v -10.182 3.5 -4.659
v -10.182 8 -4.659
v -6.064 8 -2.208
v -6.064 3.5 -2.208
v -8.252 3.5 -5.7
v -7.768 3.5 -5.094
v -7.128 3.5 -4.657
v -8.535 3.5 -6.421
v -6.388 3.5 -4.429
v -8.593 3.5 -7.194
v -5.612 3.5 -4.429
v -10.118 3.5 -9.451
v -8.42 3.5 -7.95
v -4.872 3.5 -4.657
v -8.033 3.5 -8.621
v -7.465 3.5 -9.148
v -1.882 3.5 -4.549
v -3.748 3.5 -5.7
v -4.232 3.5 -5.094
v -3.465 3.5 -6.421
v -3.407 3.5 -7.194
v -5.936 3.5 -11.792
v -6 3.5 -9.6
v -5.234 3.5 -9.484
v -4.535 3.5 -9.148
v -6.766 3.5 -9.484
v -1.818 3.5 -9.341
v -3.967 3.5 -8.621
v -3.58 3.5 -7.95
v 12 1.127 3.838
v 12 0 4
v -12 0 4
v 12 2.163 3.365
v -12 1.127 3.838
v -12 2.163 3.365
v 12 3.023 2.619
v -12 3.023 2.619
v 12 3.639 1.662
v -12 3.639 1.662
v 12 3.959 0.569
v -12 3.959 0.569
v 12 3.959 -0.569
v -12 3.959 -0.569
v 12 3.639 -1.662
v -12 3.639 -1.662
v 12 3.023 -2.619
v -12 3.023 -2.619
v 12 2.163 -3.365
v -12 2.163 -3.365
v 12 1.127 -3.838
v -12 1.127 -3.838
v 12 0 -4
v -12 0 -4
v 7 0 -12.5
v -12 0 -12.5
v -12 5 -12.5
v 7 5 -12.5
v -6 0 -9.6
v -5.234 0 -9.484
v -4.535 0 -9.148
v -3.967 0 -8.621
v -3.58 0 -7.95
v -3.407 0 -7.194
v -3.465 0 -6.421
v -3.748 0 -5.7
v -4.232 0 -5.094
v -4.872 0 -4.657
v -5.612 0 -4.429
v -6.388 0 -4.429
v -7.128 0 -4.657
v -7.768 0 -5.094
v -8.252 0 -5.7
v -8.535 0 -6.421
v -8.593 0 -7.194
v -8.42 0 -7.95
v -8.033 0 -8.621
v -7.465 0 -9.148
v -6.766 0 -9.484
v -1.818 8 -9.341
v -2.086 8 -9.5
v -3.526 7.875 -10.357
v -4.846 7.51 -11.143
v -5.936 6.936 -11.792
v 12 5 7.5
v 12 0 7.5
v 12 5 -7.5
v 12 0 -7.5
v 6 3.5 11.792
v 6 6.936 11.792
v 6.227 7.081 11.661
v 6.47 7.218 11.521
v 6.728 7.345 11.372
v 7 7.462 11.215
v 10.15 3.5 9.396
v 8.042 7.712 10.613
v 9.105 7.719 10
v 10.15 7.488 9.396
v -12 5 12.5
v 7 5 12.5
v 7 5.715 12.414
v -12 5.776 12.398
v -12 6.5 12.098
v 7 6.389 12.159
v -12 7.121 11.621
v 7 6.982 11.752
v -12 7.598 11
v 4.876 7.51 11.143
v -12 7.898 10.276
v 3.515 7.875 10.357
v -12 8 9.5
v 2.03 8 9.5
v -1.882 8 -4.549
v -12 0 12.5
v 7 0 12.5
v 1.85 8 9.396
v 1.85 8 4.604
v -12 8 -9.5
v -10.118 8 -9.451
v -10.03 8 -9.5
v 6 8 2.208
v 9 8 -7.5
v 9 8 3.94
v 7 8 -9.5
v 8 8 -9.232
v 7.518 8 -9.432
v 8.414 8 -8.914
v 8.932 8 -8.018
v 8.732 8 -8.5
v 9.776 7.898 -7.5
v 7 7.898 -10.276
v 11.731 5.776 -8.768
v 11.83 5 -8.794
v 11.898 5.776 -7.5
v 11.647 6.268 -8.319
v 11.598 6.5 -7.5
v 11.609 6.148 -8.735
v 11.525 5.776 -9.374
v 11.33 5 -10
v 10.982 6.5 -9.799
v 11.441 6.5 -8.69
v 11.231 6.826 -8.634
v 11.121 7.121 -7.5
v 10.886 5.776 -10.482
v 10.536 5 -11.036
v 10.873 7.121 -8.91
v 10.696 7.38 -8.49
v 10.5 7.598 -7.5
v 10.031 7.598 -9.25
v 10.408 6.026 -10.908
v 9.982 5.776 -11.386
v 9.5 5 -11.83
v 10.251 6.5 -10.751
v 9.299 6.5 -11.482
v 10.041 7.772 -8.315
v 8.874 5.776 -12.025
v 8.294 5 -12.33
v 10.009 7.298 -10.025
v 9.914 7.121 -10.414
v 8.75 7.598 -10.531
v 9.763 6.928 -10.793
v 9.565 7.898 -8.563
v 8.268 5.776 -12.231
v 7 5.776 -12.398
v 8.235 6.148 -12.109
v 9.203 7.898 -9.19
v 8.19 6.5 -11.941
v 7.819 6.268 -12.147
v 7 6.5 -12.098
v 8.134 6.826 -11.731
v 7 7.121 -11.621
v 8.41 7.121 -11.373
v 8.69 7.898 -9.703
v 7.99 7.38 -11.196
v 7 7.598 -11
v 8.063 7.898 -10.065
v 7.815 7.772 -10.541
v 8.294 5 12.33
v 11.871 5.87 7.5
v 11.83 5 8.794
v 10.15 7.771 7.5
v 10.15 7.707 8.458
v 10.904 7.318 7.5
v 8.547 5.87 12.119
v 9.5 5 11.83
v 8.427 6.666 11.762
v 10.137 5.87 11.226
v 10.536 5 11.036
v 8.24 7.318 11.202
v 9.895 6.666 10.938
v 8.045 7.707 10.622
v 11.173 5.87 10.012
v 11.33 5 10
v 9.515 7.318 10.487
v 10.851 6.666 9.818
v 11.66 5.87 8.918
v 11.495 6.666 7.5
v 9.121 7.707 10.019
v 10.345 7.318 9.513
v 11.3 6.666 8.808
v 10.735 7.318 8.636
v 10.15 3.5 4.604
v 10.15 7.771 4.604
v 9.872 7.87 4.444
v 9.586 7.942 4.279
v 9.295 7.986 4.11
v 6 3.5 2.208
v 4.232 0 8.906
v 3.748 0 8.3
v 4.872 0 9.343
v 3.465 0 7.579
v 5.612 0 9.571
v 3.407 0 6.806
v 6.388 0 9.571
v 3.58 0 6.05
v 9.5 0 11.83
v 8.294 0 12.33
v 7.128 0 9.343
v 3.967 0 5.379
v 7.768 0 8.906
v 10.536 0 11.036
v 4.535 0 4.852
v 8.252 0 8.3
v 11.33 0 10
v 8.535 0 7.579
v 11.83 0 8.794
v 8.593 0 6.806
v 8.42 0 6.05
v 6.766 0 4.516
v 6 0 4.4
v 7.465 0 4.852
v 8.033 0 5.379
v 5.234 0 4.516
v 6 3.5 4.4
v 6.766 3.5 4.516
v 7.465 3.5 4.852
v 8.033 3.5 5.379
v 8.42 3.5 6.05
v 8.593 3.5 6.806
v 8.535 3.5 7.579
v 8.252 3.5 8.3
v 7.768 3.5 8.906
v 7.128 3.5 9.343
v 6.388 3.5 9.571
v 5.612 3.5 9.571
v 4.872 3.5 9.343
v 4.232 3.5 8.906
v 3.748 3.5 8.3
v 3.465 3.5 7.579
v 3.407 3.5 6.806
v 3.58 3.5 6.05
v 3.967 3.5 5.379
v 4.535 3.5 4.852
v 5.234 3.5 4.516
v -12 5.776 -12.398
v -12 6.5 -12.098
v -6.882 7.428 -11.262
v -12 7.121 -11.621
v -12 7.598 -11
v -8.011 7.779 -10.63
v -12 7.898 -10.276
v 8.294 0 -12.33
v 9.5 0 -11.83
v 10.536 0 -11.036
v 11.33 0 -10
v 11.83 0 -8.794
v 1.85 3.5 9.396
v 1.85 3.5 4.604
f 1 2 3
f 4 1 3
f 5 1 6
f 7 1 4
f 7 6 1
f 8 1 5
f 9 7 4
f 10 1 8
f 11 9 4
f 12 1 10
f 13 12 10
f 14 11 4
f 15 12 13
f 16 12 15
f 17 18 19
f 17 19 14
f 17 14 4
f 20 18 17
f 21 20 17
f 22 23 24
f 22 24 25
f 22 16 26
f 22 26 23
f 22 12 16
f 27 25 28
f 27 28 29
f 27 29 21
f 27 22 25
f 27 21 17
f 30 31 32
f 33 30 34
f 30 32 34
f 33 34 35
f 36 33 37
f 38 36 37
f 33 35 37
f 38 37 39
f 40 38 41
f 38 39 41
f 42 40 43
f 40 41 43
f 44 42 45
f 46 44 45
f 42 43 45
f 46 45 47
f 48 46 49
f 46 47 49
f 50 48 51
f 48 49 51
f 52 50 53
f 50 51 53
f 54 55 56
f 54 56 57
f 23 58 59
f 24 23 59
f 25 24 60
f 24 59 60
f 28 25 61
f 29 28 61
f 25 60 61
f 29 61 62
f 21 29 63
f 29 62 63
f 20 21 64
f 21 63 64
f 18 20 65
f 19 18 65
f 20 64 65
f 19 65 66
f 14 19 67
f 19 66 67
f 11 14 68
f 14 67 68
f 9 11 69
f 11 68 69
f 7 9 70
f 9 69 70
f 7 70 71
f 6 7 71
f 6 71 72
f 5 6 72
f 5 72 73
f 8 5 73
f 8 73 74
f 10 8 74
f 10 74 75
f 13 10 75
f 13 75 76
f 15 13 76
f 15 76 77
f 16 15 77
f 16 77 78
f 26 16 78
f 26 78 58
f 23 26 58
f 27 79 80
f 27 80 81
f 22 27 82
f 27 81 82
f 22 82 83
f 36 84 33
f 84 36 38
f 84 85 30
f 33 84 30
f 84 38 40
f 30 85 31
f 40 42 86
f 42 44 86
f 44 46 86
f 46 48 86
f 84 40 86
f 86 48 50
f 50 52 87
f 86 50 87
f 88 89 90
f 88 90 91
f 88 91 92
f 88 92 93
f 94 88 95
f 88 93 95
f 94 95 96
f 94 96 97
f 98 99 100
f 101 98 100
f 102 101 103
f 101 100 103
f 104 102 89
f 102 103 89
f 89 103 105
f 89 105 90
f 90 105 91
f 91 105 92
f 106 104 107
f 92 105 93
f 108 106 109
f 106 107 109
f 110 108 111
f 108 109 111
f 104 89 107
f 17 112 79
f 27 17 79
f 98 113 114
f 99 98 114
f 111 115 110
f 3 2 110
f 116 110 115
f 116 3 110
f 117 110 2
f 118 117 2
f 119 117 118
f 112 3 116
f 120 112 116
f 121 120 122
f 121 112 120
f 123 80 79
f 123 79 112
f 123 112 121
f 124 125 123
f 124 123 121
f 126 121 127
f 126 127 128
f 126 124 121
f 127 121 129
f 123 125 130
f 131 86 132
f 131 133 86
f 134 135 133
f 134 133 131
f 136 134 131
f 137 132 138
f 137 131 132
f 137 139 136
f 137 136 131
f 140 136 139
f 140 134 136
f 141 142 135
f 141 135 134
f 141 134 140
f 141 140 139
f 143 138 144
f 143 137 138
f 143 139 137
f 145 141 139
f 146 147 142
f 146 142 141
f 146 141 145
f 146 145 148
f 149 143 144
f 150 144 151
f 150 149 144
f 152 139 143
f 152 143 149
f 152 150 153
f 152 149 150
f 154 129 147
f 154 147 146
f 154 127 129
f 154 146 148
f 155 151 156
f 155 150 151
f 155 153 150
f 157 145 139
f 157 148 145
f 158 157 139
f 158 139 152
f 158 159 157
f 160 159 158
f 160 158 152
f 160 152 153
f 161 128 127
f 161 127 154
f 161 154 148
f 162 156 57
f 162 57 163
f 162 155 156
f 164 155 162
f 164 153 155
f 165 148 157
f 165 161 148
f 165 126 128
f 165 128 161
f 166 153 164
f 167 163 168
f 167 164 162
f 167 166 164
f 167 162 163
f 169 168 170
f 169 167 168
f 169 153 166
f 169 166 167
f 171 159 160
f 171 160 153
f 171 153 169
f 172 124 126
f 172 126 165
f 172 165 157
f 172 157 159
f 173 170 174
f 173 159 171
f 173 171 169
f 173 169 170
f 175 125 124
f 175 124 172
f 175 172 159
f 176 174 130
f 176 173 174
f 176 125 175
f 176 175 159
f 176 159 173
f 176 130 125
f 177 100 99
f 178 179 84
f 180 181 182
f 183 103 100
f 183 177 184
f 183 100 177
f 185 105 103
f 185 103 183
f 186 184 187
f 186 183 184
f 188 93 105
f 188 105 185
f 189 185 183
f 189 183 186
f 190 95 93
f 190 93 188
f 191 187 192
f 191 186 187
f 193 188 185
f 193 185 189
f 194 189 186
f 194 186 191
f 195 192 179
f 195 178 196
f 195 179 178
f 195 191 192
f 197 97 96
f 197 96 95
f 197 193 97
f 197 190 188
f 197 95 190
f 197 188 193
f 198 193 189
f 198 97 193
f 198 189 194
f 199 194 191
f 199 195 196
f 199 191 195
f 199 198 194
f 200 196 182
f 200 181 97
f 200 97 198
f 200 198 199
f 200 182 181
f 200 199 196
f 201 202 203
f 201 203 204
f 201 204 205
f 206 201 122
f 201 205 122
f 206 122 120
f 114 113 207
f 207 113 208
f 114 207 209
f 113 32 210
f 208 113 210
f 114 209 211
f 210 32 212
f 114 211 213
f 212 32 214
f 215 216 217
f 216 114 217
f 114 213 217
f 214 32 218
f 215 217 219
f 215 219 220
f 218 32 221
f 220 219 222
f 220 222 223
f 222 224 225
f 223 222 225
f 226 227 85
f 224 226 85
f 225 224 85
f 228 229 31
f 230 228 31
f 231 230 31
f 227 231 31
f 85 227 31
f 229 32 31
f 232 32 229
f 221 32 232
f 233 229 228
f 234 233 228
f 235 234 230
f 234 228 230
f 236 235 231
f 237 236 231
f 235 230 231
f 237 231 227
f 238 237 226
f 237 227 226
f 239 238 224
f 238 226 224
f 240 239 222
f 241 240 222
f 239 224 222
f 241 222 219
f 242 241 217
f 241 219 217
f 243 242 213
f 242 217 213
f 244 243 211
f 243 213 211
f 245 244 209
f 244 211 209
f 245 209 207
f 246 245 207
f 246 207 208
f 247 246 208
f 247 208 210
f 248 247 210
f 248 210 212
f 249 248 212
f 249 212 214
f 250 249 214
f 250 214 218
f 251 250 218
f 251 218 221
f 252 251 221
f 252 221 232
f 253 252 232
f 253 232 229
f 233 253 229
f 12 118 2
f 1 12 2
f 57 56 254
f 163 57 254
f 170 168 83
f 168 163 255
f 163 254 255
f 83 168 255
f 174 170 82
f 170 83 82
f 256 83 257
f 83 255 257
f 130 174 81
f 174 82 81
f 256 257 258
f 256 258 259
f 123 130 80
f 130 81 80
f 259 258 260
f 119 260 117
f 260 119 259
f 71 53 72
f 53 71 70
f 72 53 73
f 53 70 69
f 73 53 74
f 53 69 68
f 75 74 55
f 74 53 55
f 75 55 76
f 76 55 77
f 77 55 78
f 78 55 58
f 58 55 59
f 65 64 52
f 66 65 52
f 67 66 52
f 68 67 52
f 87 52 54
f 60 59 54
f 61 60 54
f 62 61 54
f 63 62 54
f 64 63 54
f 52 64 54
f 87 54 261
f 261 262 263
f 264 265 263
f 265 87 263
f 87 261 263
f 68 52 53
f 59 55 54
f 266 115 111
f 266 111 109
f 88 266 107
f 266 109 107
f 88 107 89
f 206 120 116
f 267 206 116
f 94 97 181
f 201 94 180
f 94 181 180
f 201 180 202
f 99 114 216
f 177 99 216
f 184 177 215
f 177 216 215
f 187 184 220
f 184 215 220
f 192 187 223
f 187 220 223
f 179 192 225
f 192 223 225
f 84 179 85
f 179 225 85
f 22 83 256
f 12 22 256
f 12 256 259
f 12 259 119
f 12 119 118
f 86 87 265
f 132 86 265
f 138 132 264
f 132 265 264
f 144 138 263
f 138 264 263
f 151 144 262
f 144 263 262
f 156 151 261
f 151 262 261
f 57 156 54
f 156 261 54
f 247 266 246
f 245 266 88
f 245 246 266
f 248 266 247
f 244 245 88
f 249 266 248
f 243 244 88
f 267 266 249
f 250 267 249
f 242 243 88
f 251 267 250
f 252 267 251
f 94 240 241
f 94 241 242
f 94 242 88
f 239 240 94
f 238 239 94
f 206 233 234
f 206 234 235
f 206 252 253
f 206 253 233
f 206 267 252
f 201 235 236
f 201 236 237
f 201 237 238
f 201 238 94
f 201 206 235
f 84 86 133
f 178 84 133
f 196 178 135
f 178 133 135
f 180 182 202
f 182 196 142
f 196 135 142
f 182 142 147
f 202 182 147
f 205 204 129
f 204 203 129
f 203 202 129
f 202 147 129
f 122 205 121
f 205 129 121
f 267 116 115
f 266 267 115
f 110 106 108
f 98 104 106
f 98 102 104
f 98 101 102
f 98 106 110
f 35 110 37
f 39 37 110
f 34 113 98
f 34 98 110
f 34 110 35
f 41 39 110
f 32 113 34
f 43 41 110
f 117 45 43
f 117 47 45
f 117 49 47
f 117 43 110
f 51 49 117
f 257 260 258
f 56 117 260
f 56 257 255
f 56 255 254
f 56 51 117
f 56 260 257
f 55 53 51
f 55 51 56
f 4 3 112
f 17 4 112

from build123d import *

# Parameters (mm, degrees)
SKETCH1_W           = 24
SKETCH1_H           = 25
BOSS_EXTRUDE1_DEPTH = 8
SKETCH2_R           = 4
CUT_EXTRUDE1_DEPTH  = 29.217902119
SKETCH3_R           = 2.6
CUT_EXTRUDE2_DEPTH  = 20.085334684
FILLET1_R           = 3
FILLET2_R           = 5
CUT_EXTRUDE3_DEPTH  = 4.5


with BuildPart() as part:
    # Sketch1 → Boss-Extrude1 (new body)
    with BuildSketch(Plane(origin=(0, 0, 0), x_dir=(1, 0, 0), z_dir=(0, 1, 0))):
        Rectangle(SKETCH1_W, SKETCH1_H)
    extrude(amount=BOSS_EXTRUDE1_DEPTH)

    # Sketch2 → Cut-Extrude1 (cut, through all)
    with BuildSketch(Plane.ZY.offset(12)):
        Circle(SKETCH2_R)
    extrude(amount=-CUT_EXTRUDE1_DEPTH, mode=Mode.SUBTRACT)

    # Sketch3 → Cut-Extrude2 (cut, through all)
    with BuildSketch(Plane.XZ):
        with Locations(Location((-6, -7, 0), (0, 0, 270))):
            Circle(SKETCH3_R)
        with Locations(Location((6, 7, 0), (0, 0, 270))):
            Circle(SKETCH3_R)
    extrude(amount=-CUT_EXTRUDE2_DEPTH, mode=Mode.SUBTRACT)

    # Fillet1
    # the kernel refuses this fillet: 3 mm, written as the material it takes off along each edge
    with BuildSketch(Plane(origin=(19.5, 8, 12.5), x_dir=(0, 0, -1), z_dir=(-1, 0, 0))) as fillet1_piece_1:
        with BuildLine():
            CenterArc((FILLET1_R, FILLET1_R), FILLET1_R, 180, 90)
            Line((0, FILLET1_R), (0, 0))
            Line((0, 0), (FILLET1_R, 0))
        make_face()
    extrude(amount=39, mode=Mode.SUBTRACT)
    with BuildSketch(Plane(origin=(12, 8, -20), x_dir=(0, -1, 0), z_dir=(0, 0, 1))) as fillet1_piece_2:
        with BuildLine():
            CenterArc((FILLET1_R, -FILLET1_R), FILLET1_R, 90, 90)
            Line((0, -FILLET1_R), (0, 0))
            Line((0, 0), (FILLET1_R, 0))
        make_face()
    extrude(amount=40, mode=Mode.SUBTRACT)
    with BuildSketch(Plane(origin=(-19.5, 8, -12.5), x_dir=(0, -1, 0), z_dir=(1, 0, 0))) as fillet1_piece_3:
        with BuildLine():
            CenterArc((FILLET1_R, -FILLET1_R), FILLET1_R, 90, 90)
            Line((0, -FILLET1_R), (0, 0))
            Line((0, 0), (FILLET1_R, 0))
        make_face()
    extrude(amount=39, mode=Mode.SUBTRACT)

    # Fillet2
    # the kernel refuses this fillet: 5 mm, written as the material it takes off along each edge
    with BuildSketch(Plane(origin=(7, 8, 7.5), x_dir=(0, 0, 1), z_dir=(-1, 0, 0))) as fillet2_piece_1:
        with BuildLine():
            CenterArc((2, -3), 3, 0, 90)
            Line((5, -3), (5, 0))
            Line((5, 0), (2, 0))
        make_face()
    revolve(axis=Axis((7, 8, 7.5), (0, 1, 0)), revolution_arc=90, mode=Mode.SUBTRACT)
    with BuildSketch(Plane(origin=(7, 8, -7.5), x_dir=(1, 0, 0), z_dir=(0, 0, 1))) as fillet2_piece_2:
        with BuildLine():
            CenterArc((2, -3), 3, 0, 90)
            Line((5, -3), (5, 0))
            Line((5, 0), (2, 0))
        make_face()
    revolve(axis=Axis((7, 8, -7.5), (0, 1, 0)), revolution_arc=90, mode=Mode.SUBTRACT)
    with BuildSketch(Plane(origin=(12, -12.5, -12.5), x_dir=(-1, 0, 0), z_dir=(0, 1, 0)), Plane(origin=(12, -12.5, 12.5), x_dir=(0, 0, -1), z_dir=(0, 1, 0))) as fillet2_piece_3:
        with BuildLine():
            CenterArc((FILLET2_R, FILLET2_R), FILLET2_R, 180, 90)
            Line((0, FILLET2_R), (0, 0))
            Line((0, 0), (FILLET2_R, 0))
        make_face()
    extrude(amount=20.5, mode=Mode.SUBTRACT)

    # Sketch4 → Cut-Extrude3 (cut)
    with BuildSketch(Plane(origin=(0, 8, 0), x_dir=(1, 0, 0), z_dir=(0, 1, 0))):
        Polygon((6, -11.792007234), (10.15, -9.396003617), (10.15, -4.603996383), (6, -2.207992766), (1.85, -4.603996383), (1.85, -9.396003617), align=None)
        Polygon((-6.063761716, 2.208416986), (-1.882248244, 4.548989227), (-1.818486528, 9.340572241), (-5.936238284, 11.791583014), (-10.117751756, 9.451010773), (-10.181513472, 4.659427759), align=None)
    extrude(amount=-CUT_EXTRUDE3_DEPTH, mode=Mode.SUBTRACT)


solid = part.part
